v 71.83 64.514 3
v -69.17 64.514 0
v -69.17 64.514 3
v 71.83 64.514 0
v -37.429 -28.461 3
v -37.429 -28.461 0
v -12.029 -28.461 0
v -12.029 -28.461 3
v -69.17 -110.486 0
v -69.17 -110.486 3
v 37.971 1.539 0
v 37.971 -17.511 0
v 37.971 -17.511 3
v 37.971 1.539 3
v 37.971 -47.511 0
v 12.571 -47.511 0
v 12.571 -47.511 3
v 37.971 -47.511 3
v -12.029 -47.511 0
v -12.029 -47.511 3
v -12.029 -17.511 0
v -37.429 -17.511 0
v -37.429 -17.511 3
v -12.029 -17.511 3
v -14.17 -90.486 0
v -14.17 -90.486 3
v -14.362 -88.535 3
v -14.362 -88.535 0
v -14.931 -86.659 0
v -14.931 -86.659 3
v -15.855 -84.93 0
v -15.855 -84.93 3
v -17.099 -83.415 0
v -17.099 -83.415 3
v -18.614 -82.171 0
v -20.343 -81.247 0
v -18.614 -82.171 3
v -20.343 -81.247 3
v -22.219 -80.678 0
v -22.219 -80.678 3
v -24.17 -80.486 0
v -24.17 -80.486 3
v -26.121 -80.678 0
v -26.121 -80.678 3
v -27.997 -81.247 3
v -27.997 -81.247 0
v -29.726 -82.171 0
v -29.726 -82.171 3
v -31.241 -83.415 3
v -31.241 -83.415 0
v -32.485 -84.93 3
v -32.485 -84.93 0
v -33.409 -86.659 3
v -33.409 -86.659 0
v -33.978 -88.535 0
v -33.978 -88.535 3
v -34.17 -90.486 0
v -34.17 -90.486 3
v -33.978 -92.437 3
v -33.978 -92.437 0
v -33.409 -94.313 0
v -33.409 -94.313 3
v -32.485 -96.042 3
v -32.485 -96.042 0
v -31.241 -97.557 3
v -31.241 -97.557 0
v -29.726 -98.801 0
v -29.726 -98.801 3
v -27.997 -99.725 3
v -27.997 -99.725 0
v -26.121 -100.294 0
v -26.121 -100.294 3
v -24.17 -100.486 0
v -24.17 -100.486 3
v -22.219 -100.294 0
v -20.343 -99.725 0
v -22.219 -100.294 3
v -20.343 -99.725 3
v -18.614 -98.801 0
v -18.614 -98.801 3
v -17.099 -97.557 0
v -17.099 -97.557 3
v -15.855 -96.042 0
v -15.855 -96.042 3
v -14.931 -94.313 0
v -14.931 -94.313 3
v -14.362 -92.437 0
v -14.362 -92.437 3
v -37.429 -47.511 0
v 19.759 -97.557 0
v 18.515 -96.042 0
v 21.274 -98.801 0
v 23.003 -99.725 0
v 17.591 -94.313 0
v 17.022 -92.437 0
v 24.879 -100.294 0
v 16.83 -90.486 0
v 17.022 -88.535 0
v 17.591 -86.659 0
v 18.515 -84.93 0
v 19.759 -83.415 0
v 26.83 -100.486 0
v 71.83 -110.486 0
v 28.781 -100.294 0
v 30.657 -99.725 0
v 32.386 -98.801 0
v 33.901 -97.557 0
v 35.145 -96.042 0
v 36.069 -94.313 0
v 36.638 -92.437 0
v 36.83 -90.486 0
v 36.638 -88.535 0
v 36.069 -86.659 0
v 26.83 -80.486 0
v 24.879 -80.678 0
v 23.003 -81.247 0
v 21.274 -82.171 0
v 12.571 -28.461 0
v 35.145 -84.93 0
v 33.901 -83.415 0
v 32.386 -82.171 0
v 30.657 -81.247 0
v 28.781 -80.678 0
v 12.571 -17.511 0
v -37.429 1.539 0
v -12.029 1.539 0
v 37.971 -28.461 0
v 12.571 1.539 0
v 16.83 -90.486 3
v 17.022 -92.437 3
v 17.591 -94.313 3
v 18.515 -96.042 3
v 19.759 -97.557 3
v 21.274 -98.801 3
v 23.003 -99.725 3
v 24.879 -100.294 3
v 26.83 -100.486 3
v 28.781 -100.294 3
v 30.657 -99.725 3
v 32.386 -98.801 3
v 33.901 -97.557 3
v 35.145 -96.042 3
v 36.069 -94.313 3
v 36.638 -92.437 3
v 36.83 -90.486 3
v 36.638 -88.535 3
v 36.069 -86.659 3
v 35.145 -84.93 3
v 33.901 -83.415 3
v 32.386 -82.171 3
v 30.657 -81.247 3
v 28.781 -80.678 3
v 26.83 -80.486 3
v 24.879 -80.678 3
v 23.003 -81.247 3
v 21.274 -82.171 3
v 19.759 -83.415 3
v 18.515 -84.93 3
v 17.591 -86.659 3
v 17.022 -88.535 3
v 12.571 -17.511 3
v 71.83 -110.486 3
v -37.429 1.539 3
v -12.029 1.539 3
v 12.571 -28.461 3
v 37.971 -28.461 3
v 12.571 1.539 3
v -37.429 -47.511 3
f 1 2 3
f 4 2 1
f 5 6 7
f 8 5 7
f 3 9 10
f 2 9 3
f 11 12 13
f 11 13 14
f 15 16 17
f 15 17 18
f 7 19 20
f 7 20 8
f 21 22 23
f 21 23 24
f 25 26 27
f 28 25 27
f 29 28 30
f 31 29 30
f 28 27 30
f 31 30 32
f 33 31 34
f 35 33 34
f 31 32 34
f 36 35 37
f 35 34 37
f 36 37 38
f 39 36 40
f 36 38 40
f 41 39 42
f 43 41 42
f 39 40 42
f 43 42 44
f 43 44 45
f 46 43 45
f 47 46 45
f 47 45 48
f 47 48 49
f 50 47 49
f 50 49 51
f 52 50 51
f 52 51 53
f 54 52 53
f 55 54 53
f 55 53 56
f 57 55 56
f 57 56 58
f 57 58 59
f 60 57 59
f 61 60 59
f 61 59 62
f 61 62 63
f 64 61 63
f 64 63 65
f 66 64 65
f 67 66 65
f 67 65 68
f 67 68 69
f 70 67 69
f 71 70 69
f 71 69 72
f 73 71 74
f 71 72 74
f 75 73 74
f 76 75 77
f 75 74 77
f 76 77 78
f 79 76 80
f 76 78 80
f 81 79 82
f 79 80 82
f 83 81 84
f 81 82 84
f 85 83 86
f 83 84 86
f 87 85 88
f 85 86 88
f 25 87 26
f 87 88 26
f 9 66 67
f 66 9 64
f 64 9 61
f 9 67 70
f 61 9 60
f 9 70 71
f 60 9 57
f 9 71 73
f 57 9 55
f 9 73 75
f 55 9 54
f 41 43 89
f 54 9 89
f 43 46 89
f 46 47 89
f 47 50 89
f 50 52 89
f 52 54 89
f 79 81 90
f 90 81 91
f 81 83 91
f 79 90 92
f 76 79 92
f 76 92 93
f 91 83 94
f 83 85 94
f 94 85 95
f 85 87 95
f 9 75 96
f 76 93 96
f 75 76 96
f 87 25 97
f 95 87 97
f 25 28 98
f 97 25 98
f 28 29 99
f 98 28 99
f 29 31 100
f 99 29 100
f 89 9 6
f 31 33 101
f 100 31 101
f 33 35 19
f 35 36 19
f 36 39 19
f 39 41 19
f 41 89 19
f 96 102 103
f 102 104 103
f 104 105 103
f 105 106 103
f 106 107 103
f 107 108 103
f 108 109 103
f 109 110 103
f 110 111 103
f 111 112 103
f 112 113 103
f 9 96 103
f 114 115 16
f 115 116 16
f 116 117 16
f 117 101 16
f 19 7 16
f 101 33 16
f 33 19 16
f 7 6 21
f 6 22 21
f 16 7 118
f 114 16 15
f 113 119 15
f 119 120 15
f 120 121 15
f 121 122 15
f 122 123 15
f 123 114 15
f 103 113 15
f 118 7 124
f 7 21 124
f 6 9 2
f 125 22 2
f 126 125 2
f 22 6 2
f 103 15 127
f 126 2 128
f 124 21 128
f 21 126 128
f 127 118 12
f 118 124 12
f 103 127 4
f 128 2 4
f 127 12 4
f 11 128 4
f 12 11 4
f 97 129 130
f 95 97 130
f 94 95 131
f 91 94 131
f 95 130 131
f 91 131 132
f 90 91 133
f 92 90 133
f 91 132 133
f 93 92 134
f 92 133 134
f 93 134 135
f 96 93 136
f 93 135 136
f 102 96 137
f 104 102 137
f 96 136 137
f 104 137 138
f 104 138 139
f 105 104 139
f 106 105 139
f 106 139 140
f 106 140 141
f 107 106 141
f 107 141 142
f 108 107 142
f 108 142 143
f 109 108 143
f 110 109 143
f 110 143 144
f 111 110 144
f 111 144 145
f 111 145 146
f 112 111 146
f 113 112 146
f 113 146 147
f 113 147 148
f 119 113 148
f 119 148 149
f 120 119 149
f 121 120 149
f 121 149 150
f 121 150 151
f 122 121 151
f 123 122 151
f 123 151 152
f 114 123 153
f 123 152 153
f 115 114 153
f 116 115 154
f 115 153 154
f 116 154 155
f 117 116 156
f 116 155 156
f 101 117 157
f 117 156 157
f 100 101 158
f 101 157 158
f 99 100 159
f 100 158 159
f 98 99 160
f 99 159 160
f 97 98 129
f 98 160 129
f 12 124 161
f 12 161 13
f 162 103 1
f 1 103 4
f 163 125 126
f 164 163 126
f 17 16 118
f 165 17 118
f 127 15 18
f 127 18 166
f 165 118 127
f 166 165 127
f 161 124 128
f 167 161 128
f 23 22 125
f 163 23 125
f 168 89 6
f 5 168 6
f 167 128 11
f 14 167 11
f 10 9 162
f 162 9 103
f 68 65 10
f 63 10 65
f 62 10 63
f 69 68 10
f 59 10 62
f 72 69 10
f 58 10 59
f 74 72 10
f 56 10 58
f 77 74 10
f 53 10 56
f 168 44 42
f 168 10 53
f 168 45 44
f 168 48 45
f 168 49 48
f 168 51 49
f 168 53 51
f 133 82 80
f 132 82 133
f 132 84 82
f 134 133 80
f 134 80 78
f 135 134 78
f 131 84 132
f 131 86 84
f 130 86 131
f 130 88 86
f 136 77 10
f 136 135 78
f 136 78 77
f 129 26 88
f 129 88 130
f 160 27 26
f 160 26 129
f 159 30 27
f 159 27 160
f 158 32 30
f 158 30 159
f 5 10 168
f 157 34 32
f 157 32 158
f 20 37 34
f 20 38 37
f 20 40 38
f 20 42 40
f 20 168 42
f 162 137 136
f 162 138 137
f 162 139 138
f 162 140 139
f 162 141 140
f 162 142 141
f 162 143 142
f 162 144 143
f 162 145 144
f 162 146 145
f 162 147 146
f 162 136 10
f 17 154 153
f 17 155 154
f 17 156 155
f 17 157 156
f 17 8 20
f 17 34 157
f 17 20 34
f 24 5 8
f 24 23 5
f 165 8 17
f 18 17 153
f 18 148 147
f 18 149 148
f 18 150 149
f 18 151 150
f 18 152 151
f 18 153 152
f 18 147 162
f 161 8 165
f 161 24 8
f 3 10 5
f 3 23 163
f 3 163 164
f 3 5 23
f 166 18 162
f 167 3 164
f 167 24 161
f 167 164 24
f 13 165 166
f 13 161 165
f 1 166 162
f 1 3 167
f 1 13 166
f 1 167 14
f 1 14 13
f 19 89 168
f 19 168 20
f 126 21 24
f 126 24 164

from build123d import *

# Parameters (mm, degrees)
SKETCH1_W               = 141
SKETCH1_H               = 175
BOSS_EXTRUDE1_DEPTH     = 3
CUT_EXTRUDE1_DEPTH      = 132.816914117
CUT_EXTRUDE1_DEPTH_BACK = 132.816914117
SKETCH4_W               = 25.4
SKETCH4_H               = 19.05
SKETCH5_R               = 10
CUT_EXTRUDE2_DEPTH      = 132.816914117


with BuildPart() as part:
    # Sketch1 → Boss-Extrude1 (new body)
    with BuildSketch(Plane.XY):
        with Locations((1.330188679, -22.985849057)):
            Rectangle(SKETCH1_W, SKETCH1_H)
    extrude(amount=BOSS_EXTRUDE1_DEPTH)

    # Sketch4 → Cut-Extrude1 (cut, two sides: drawn at the far end of the back side and taken through both)
    with BuildSketch(Plane.XY.offset(3).offset(-CUT_EXTRUDE1_DEPTH_BACK)):
        with Locations((25.270813238, -37.985849057)):
            Rectangle(SKETCH4_W, SKETCH4_H)
        with Locations((25.270813238, -7.985849057)):
            Rectangle(SKETCH4_W, SKETCH4_H)
        with Locations((-24.729186762, -37.985849057)):
            Rectangle(SKETCH4_W, SKETCH4_H)
        with Locations((-24.729186762, -7.985849057)):
            Rectangle(SKETCH4_W, SKETCH4_H)
    extrude(amount=CUT_EXTRUDE1_DEPTH + CUT_EXTRUDE1_DEPTH_BACK, mode=Mode.SUBTRACT)

    # Sketch5 → Cut-Extrude2 (cut, through all)
    with BuildSketch(Plane.XY.offset(3)):
        with Locations((-24.169811321, -90.485849057)):
            Circle(SKETCH5_R)
        with Locations(Location((26.830188679, -90.485849057, 0), (0, 0, 180))):
            Circle(SKETCH5_R)
    extrude(amount=-CUT_EXTRUDE2_DEPTH, mode=Mode.SUBTRACT)


solid = part.part
